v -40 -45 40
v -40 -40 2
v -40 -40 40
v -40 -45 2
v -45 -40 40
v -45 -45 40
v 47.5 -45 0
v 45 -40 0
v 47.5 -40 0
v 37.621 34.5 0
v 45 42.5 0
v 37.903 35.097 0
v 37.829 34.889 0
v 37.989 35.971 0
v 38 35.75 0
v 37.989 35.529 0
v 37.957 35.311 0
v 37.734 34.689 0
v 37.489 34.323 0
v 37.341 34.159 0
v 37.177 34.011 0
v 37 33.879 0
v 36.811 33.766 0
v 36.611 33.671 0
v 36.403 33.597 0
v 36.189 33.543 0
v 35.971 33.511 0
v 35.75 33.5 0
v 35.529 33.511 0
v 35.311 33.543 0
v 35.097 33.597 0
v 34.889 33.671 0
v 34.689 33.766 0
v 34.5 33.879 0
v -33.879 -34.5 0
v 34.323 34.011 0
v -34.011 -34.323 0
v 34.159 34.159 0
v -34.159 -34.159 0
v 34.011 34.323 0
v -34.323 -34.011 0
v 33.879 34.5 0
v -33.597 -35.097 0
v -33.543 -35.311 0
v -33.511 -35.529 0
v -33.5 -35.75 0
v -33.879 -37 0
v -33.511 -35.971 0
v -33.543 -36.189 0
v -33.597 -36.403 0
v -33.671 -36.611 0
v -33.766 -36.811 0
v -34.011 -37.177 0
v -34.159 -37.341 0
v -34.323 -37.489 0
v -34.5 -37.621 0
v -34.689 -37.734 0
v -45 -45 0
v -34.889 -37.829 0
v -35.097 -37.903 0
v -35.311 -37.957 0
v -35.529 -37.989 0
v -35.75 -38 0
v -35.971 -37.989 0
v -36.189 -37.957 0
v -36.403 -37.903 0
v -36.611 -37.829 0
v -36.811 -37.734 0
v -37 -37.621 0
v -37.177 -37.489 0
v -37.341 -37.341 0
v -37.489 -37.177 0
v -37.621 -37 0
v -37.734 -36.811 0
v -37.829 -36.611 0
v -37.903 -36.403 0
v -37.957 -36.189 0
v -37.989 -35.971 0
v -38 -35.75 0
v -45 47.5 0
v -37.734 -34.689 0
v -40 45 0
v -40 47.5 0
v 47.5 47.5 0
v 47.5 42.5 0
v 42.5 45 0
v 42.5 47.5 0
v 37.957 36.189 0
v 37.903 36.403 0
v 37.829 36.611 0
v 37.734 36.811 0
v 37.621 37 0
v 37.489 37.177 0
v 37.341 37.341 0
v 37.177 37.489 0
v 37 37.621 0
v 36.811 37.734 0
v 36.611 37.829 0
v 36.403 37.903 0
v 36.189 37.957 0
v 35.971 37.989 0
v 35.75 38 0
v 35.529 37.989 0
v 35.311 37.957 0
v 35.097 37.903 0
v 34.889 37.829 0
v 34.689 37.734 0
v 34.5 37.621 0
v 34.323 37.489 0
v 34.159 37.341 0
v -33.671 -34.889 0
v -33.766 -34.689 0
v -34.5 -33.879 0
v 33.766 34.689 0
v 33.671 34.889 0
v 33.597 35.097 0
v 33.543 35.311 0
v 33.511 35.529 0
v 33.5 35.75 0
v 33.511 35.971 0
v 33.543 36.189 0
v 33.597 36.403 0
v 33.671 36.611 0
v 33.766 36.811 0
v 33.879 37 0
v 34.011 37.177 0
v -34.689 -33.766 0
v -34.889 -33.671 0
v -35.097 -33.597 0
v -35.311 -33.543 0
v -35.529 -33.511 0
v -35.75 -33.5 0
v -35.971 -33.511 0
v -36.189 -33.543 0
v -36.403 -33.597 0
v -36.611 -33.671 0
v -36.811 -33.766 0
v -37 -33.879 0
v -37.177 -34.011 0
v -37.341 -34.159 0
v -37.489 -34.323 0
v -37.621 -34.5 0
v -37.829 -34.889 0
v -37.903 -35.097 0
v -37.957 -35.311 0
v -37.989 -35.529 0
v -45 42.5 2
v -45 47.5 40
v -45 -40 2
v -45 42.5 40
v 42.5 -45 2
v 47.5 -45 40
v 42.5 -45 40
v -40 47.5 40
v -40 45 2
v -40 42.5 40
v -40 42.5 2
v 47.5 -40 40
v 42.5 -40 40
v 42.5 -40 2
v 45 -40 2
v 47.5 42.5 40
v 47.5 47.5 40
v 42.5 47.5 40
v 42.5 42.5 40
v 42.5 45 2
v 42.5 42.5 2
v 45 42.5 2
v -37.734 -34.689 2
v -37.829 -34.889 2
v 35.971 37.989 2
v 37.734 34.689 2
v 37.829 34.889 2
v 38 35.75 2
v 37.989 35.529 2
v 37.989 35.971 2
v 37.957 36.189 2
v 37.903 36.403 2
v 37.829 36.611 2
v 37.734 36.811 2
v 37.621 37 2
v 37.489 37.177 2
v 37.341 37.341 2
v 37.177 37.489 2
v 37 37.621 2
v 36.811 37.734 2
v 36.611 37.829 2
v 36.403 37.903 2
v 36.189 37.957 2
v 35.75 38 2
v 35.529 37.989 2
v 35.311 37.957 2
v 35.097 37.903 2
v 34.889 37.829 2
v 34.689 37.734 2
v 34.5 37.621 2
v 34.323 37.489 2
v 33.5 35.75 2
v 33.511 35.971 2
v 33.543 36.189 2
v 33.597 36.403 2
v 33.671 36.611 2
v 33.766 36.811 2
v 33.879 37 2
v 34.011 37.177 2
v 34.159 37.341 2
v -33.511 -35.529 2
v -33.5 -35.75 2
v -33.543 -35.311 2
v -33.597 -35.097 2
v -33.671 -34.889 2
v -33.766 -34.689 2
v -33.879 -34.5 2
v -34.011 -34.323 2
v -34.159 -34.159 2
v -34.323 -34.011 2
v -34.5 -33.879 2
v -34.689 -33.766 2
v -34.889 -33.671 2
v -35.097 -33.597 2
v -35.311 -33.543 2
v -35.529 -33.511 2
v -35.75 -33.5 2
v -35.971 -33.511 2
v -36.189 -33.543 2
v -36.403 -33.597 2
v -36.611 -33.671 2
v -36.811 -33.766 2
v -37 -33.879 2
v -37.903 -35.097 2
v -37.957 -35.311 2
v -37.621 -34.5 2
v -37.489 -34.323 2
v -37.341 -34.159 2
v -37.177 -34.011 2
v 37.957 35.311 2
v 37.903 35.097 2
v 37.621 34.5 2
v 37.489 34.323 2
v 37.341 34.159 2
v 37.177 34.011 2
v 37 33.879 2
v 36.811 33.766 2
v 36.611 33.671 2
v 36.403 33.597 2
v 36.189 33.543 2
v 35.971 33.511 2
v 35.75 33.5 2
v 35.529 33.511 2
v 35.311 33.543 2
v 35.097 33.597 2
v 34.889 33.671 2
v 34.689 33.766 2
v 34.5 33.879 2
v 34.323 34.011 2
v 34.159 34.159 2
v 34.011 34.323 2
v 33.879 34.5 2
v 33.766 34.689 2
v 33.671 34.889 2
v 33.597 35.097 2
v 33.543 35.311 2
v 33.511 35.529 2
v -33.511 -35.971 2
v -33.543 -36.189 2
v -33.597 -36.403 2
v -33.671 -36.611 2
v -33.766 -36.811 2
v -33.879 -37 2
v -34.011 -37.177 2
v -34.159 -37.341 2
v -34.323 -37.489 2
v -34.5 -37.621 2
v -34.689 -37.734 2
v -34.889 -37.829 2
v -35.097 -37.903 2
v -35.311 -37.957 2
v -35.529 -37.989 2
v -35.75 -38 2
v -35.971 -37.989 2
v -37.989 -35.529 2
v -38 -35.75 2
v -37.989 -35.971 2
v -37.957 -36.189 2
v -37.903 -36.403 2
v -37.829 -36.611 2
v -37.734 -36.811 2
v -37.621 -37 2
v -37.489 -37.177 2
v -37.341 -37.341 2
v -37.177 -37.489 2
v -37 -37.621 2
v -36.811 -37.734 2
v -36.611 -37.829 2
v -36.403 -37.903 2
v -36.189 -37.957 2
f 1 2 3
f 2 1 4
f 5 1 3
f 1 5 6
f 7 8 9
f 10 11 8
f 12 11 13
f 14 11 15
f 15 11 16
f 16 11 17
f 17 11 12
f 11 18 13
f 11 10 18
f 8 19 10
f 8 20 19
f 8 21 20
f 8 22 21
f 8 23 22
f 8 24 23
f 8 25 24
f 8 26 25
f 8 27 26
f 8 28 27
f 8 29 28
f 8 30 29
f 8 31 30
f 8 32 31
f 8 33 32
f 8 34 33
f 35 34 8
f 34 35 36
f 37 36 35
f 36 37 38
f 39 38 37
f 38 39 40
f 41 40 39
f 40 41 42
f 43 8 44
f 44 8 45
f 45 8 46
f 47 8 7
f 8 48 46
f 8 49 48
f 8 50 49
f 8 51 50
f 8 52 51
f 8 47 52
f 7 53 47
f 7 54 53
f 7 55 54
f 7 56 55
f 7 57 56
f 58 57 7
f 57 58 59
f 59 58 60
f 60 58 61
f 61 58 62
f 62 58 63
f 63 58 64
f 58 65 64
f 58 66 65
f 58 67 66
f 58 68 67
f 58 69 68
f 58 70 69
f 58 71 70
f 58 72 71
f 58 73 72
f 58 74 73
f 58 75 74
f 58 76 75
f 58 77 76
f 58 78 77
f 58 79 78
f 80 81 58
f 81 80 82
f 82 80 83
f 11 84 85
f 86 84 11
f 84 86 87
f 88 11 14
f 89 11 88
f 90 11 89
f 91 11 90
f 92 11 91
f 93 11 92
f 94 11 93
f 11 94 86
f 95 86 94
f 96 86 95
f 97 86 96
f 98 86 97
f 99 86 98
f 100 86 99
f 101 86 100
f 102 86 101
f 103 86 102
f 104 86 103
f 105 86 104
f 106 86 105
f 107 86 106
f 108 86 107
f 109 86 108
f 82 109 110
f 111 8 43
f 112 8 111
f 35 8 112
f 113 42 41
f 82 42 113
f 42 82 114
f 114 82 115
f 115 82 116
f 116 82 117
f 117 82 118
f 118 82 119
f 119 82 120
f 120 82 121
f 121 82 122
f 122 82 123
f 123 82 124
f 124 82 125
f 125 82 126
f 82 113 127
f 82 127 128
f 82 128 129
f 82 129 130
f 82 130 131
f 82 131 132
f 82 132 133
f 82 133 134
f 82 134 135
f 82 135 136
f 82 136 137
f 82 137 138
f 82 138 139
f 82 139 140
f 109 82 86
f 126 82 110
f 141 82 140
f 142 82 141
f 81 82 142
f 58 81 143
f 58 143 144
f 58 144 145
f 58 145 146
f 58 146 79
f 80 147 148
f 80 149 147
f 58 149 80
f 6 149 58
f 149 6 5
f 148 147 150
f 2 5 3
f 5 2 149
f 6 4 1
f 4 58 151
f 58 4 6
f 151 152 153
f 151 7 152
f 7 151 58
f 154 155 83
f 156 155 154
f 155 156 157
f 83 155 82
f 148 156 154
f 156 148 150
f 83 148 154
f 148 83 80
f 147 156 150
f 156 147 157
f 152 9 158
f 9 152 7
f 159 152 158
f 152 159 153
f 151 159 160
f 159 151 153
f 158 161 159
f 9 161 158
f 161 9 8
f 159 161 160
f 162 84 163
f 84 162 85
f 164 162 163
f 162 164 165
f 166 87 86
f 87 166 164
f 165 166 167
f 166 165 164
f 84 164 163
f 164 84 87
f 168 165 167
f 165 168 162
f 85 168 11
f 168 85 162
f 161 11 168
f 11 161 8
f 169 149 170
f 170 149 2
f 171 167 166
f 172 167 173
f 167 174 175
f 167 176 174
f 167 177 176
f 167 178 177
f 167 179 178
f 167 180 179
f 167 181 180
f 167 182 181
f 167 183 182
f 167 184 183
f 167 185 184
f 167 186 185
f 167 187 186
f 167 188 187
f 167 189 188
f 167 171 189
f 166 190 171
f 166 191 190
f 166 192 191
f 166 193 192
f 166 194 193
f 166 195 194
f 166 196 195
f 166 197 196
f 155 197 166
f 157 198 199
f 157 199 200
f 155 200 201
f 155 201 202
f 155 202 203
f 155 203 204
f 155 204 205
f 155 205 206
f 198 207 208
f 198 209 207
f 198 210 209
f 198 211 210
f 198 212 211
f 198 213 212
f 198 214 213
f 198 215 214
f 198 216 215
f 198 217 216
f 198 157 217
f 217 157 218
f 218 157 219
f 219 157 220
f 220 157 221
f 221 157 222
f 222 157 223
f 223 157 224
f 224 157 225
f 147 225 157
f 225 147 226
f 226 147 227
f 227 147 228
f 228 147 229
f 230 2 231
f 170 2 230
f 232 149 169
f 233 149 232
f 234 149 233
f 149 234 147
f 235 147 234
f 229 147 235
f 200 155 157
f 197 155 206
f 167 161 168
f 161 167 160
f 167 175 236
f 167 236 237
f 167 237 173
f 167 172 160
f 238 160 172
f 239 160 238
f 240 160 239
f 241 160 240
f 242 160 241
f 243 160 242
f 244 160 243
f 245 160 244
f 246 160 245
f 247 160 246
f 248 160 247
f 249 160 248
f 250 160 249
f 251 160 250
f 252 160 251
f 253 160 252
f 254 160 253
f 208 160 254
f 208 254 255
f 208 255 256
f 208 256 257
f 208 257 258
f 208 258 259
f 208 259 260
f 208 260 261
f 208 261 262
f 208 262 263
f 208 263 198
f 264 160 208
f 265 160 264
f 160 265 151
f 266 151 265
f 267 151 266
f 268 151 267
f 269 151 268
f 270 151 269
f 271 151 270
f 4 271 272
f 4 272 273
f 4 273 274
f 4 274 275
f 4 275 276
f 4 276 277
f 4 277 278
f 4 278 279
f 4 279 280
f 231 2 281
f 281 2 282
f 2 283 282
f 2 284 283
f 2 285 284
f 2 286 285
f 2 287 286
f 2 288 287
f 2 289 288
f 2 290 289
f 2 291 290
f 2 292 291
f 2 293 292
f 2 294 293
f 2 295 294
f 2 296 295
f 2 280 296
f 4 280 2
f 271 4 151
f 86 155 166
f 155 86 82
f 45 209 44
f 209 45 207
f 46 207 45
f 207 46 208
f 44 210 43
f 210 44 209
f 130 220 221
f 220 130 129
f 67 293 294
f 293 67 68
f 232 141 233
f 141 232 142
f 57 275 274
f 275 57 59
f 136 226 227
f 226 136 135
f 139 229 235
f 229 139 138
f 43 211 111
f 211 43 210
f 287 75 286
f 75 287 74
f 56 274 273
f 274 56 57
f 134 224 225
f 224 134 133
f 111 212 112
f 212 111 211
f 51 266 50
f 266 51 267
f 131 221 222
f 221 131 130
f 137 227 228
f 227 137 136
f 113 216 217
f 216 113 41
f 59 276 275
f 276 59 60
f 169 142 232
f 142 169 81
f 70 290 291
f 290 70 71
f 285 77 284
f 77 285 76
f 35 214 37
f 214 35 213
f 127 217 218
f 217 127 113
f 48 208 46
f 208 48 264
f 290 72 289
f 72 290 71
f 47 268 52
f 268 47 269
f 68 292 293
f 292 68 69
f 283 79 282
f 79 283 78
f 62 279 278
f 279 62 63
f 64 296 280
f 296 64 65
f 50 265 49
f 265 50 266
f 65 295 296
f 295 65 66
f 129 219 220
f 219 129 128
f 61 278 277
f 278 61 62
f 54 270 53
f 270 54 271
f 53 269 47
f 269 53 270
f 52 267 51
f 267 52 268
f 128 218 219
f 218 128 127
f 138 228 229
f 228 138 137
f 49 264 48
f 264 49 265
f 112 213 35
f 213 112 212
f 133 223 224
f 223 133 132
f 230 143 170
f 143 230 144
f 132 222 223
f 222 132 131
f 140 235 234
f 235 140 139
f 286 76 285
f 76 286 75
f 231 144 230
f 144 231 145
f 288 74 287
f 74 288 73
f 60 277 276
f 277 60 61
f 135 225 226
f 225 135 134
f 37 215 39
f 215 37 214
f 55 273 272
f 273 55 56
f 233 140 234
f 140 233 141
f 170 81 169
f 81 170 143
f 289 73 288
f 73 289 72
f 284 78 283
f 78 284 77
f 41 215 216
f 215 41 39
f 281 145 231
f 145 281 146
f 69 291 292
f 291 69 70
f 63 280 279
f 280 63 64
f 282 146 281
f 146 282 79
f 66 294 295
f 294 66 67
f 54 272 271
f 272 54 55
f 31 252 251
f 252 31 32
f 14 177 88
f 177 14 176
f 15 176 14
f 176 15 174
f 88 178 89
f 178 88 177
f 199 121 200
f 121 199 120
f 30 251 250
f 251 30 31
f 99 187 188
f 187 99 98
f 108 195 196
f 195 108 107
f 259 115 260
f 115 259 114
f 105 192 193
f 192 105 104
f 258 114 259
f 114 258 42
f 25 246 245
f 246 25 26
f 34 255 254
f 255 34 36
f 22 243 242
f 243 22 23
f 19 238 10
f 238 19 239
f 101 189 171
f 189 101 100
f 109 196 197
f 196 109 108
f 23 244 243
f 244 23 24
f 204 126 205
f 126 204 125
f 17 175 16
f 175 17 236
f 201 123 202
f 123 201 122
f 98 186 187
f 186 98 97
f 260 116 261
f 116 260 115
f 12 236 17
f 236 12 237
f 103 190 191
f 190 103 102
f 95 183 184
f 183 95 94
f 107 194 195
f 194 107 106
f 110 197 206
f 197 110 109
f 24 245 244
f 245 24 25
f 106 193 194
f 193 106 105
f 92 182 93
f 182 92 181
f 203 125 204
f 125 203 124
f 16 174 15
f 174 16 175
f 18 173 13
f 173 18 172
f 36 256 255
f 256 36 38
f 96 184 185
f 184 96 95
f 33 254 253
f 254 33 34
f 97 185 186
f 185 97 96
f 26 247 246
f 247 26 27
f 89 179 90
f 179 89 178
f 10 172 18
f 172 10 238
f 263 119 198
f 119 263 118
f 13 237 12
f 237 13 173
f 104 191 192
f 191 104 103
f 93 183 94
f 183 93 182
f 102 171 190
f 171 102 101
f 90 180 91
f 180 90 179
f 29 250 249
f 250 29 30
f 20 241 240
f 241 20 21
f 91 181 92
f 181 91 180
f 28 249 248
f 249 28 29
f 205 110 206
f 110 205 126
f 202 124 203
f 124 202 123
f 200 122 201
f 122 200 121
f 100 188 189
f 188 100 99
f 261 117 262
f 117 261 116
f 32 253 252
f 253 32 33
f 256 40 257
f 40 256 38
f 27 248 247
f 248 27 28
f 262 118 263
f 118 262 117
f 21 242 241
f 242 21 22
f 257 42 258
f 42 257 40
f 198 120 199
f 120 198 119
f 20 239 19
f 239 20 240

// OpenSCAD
// DIY magnetic stirrer housing (print orientation: top plate down, open box up)
// Units: mm

$fn = 64;

// --- Box dimensions ---
outer_x   = 90;    // outer size in X
outer_y   = 90;    // outer size in Y
top_t     = 2;     // top plate thickness (z = 0 to 2)
wall_t    = 2.5;   // wall thickness (z = 2 to 40)
box_h     = 40;    // top of walls (z)
notch_w   = 12;    // cable notch width
notch_d   = 8;     // cable notch depth from open edge (z = 32 to 40)

// --- Screw holes ---
screw_d   = 4.5;   // M4 hole diameter
screw_n   = 4;     // number of holes
screw_p   = 71.5;  // square pattern pitch (centred)

// --- Cutting overlap ---
eps       = 0.5;   // extension past cut faces

difference() {
    // Solid box
    union() {
        // Top plate
        translate([-outer_x/2, -outer_y/2, 0])
            cube([outer_x, outer_y, top_t]);
        // Walls (slightly overlapping the plate for a clean union)
        for (sx = [-1, 1], sy = [-1, 1])
            translate([sx > 0 ? outer_x/2 - wall_t : -outer_x/2,
                       sy > 0 ? outer_y/2 - wall_t : -outer_y/2,
                       0])
                cube([2*wall_t, 2*wall_t, box_h]);
    }

    // Screw holes through top plate
    for (i = [0 : screw_n - 1]) {
        x = (i - (screw_n - 1)/2) * screw_p;
        y = (i - (screw_n - 1)/2) * screw_p;
        translate([x, y, -eps])
            cylinder(d = screw_d, h = top_t + 2*eps);
    }

    // Cable notch in one wall (from open edge down to z = 32)
    translate([outer_x/2 - wall_t - notch_w/2, -notch_w/2, box_h - notch_d])
        cube([notch_w, notch_w, notch_d + eps]);
}
